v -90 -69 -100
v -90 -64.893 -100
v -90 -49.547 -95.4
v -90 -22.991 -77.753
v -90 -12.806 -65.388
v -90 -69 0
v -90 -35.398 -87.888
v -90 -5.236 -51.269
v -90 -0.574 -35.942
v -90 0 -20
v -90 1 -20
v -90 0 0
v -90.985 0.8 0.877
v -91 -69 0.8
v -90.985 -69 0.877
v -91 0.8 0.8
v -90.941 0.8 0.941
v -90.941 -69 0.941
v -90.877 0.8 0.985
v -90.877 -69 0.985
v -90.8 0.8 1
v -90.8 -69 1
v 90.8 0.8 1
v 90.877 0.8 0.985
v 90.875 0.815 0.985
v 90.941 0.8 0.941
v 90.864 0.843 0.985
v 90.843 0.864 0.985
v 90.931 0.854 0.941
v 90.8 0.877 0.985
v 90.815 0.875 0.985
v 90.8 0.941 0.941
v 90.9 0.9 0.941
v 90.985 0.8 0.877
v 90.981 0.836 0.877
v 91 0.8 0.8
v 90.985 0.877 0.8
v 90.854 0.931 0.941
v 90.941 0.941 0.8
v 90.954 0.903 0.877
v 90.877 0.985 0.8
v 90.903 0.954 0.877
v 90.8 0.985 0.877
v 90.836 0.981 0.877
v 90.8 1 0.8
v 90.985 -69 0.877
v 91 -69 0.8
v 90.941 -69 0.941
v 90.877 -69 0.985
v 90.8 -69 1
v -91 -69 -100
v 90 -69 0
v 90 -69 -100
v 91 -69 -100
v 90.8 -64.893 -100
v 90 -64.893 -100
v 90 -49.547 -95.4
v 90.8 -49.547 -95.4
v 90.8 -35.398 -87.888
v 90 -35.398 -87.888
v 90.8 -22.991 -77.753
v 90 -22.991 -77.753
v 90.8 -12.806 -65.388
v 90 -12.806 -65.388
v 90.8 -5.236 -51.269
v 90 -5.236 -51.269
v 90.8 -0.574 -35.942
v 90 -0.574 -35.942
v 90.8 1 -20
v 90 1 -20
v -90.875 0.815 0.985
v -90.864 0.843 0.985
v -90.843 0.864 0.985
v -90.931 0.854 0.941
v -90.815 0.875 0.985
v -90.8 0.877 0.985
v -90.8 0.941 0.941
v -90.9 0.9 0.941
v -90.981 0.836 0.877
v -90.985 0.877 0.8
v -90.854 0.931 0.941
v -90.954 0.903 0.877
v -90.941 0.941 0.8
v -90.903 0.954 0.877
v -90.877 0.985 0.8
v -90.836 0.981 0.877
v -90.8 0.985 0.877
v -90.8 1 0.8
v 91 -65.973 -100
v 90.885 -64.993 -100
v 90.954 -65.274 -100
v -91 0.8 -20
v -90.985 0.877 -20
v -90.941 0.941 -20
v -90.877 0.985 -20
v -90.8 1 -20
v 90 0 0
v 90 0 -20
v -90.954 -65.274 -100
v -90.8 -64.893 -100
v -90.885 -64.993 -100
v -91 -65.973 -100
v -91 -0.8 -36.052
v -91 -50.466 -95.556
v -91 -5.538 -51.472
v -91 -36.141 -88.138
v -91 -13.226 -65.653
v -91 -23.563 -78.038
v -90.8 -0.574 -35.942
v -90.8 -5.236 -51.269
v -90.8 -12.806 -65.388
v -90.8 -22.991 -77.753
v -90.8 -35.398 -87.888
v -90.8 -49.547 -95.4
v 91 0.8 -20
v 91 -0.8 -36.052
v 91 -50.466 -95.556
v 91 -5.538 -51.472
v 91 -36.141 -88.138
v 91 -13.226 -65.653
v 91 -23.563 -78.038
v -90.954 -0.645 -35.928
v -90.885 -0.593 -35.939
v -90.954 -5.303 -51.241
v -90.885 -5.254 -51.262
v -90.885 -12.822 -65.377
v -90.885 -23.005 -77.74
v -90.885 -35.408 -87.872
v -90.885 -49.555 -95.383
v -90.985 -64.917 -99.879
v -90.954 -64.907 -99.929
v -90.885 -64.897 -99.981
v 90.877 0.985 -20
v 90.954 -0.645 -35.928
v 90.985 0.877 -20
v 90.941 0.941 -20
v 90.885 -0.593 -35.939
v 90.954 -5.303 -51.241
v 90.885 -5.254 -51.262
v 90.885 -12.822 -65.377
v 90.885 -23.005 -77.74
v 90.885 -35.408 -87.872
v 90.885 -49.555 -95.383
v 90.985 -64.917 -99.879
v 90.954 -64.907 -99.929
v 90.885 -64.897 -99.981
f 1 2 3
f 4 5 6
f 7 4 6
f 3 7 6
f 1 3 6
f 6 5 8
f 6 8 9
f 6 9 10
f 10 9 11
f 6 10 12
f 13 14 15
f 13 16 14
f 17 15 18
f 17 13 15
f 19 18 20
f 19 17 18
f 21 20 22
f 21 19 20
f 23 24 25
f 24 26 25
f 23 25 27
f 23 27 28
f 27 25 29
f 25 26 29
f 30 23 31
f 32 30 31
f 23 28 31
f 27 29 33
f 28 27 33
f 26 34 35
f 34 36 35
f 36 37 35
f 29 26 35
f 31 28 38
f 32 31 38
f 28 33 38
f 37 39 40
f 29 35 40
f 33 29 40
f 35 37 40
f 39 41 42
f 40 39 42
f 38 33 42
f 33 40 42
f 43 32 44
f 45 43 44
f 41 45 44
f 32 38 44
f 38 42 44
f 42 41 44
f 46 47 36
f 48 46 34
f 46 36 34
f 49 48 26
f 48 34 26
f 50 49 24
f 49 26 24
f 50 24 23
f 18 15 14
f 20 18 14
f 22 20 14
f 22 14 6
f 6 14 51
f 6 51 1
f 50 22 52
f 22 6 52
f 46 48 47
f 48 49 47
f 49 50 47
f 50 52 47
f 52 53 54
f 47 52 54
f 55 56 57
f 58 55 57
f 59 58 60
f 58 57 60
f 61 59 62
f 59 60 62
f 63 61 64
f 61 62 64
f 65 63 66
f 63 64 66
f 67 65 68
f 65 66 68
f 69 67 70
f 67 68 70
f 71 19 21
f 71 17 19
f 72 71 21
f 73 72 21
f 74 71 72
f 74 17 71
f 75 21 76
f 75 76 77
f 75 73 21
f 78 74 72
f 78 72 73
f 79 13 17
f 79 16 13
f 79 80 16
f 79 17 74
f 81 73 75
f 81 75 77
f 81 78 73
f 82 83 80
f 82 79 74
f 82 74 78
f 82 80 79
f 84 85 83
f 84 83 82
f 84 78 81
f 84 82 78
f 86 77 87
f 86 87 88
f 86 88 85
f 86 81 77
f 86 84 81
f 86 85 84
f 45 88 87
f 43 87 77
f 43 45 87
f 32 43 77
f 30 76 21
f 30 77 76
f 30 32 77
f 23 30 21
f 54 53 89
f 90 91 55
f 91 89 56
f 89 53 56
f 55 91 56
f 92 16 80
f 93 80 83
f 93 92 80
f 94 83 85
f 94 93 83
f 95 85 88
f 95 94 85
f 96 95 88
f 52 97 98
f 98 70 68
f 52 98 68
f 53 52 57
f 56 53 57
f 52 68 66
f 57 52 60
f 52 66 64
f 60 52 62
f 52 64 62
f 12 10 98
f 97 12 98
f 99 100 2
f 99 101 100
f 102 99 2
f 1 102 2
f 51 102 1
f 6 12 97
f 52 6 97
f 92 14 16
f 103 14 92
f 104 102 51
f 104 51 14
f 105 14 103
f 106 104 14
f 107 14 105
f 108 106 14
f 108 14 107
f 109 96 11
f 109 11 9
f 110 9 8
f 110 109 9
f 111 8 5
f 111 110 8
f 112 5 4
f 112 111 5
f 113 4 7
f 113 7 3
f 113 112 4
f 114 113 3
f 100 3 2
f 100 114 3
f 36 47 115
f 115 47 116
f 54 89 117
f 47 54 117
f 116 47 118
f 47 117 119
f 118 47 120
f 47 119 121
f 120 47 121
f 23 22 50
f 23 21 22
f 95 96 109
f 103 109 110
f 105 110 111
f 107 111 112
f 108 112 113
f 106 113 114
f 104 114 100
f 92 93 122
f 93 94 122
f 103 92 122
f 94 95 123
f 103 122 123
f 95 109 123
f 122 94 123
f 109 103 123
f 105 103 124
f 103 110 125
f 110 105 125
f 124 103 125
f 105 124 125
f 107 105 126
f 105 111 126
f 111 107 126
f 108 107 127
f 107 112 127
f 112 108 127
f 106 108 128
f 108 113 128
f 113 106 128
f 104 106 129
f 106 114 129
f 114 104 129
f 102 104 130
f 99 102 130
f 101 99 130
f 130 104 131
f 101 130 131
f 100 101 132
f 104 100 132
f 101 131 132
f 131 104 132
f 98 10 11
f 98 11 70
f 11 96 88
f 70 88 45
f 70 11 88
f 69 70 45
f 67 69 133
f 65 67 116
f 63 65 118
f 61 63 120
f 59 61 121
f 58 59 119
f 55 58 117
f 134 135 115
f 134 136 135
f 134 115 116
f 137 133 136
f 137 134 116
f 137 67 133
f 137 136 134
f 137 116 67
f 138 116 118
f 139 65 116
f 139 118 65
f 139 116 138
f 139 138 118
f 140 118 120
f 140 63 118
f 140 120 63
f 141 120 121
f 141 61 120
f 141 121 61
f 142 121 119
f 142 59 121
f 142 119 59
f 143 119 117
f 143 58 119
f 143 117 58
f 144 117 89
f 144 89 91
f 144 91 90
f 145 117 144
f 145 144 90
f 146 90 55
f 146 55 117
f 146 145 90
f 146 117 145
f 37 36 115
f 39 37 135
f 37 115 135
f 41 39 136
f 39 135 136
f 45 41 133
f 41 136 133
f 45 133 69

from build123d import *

# Parameters (mm, degrees)
SKETCH1_W           = 180
SKETCH1_H           = 20
BOSS_EXTRUDE2_DEPTH = 1
BOSS_EXTRUDE3_DEPTH = 1
BOSS_EXTRUDE5_START = 1
BOSS_EXTRUDE5_DEPTH = 1
SKETCH6_W           = 182
SKETCH6_H           = 70
BOSS_EXTRUDE6_DEPTH = 1
FILLET2_R           = 0.2


with BuildPart() as part:
    # Sketch1 → Boss-Extrude2 (new body)
    with BuildSketch(Plane(origin=(0, 0, 0), x_dir=(1, 0, 0), z_dir=(0, 1, 0))):
        with Locations((0, 10)):
            Rectangle(SKETCH1_W, SKETCH1_H)
    extrude(amount=BOSS_EXTRUDE2_DEPTH)

    # Sketch3 → Boss-Extrude3 (add)
    with BuildSketch(Plane(origin=(90, 0, 0), x_dir=(0, 0, -1), z_dir=(1, 0, 0))):
        with BuildLine():
            Line((0, 1), (0, -69))
            Line((0, -69), (100, -69))
            Line((100, -69), (100, -64.892848271))
            ThreePointArc((100, -64.892848271), (71.821490362, -17.594043661), (20, 1))
            Line((20, 1), (0, 1))
        make_face()
    extrude(amount=BOSS_EXTRUDE3_DEPTH)

    # Sketch5 → Boss-Extrude5 (add)
    with BuildSketch(Plane.ZY.offset(90).offset(BOSS_EXTRUDE5_START)):
        with BuildLine():
            Line((0, 1), (-20, 1))
            ThreePointArc((-20, 1), (-71.821490362, -17.594043661), (-100, -64.892848271))
            Line((-100, -64.892848271), (-100, -69))
            Line((-100, -69), (0, -69))
            Line((0, -69), (0, 1))
        make_face()
    extrude(amount=-BOSS_EXTRUDE5_DEPTH)

    # Sketch6 → Boss-Extrude6 (add)
    with BuildSketch(Plane.XY):
        with Locations((0, -34)):
            Rectangle(SKETCH6_W, SKETCH6_H)
    extrude(amount=BOSS_EXTRUDE6_DEPTH)

    # Fillet2
    fillet2_edges = [part.edges().sort_by_distance(p)[0] for p in [
        (91, 1, -9.5),
        (91, -17.594043661, -71.821490362),
        (-91, 1, -9.5),
        (-91, -17.594043661, -71.821490362),
        (-91, -34, 1),
        (91, -34, 1),
        (0, 1, 1),
    ]]
    fillet(fillet2_edges, radius=FILLET2_R)


solid = part.part
